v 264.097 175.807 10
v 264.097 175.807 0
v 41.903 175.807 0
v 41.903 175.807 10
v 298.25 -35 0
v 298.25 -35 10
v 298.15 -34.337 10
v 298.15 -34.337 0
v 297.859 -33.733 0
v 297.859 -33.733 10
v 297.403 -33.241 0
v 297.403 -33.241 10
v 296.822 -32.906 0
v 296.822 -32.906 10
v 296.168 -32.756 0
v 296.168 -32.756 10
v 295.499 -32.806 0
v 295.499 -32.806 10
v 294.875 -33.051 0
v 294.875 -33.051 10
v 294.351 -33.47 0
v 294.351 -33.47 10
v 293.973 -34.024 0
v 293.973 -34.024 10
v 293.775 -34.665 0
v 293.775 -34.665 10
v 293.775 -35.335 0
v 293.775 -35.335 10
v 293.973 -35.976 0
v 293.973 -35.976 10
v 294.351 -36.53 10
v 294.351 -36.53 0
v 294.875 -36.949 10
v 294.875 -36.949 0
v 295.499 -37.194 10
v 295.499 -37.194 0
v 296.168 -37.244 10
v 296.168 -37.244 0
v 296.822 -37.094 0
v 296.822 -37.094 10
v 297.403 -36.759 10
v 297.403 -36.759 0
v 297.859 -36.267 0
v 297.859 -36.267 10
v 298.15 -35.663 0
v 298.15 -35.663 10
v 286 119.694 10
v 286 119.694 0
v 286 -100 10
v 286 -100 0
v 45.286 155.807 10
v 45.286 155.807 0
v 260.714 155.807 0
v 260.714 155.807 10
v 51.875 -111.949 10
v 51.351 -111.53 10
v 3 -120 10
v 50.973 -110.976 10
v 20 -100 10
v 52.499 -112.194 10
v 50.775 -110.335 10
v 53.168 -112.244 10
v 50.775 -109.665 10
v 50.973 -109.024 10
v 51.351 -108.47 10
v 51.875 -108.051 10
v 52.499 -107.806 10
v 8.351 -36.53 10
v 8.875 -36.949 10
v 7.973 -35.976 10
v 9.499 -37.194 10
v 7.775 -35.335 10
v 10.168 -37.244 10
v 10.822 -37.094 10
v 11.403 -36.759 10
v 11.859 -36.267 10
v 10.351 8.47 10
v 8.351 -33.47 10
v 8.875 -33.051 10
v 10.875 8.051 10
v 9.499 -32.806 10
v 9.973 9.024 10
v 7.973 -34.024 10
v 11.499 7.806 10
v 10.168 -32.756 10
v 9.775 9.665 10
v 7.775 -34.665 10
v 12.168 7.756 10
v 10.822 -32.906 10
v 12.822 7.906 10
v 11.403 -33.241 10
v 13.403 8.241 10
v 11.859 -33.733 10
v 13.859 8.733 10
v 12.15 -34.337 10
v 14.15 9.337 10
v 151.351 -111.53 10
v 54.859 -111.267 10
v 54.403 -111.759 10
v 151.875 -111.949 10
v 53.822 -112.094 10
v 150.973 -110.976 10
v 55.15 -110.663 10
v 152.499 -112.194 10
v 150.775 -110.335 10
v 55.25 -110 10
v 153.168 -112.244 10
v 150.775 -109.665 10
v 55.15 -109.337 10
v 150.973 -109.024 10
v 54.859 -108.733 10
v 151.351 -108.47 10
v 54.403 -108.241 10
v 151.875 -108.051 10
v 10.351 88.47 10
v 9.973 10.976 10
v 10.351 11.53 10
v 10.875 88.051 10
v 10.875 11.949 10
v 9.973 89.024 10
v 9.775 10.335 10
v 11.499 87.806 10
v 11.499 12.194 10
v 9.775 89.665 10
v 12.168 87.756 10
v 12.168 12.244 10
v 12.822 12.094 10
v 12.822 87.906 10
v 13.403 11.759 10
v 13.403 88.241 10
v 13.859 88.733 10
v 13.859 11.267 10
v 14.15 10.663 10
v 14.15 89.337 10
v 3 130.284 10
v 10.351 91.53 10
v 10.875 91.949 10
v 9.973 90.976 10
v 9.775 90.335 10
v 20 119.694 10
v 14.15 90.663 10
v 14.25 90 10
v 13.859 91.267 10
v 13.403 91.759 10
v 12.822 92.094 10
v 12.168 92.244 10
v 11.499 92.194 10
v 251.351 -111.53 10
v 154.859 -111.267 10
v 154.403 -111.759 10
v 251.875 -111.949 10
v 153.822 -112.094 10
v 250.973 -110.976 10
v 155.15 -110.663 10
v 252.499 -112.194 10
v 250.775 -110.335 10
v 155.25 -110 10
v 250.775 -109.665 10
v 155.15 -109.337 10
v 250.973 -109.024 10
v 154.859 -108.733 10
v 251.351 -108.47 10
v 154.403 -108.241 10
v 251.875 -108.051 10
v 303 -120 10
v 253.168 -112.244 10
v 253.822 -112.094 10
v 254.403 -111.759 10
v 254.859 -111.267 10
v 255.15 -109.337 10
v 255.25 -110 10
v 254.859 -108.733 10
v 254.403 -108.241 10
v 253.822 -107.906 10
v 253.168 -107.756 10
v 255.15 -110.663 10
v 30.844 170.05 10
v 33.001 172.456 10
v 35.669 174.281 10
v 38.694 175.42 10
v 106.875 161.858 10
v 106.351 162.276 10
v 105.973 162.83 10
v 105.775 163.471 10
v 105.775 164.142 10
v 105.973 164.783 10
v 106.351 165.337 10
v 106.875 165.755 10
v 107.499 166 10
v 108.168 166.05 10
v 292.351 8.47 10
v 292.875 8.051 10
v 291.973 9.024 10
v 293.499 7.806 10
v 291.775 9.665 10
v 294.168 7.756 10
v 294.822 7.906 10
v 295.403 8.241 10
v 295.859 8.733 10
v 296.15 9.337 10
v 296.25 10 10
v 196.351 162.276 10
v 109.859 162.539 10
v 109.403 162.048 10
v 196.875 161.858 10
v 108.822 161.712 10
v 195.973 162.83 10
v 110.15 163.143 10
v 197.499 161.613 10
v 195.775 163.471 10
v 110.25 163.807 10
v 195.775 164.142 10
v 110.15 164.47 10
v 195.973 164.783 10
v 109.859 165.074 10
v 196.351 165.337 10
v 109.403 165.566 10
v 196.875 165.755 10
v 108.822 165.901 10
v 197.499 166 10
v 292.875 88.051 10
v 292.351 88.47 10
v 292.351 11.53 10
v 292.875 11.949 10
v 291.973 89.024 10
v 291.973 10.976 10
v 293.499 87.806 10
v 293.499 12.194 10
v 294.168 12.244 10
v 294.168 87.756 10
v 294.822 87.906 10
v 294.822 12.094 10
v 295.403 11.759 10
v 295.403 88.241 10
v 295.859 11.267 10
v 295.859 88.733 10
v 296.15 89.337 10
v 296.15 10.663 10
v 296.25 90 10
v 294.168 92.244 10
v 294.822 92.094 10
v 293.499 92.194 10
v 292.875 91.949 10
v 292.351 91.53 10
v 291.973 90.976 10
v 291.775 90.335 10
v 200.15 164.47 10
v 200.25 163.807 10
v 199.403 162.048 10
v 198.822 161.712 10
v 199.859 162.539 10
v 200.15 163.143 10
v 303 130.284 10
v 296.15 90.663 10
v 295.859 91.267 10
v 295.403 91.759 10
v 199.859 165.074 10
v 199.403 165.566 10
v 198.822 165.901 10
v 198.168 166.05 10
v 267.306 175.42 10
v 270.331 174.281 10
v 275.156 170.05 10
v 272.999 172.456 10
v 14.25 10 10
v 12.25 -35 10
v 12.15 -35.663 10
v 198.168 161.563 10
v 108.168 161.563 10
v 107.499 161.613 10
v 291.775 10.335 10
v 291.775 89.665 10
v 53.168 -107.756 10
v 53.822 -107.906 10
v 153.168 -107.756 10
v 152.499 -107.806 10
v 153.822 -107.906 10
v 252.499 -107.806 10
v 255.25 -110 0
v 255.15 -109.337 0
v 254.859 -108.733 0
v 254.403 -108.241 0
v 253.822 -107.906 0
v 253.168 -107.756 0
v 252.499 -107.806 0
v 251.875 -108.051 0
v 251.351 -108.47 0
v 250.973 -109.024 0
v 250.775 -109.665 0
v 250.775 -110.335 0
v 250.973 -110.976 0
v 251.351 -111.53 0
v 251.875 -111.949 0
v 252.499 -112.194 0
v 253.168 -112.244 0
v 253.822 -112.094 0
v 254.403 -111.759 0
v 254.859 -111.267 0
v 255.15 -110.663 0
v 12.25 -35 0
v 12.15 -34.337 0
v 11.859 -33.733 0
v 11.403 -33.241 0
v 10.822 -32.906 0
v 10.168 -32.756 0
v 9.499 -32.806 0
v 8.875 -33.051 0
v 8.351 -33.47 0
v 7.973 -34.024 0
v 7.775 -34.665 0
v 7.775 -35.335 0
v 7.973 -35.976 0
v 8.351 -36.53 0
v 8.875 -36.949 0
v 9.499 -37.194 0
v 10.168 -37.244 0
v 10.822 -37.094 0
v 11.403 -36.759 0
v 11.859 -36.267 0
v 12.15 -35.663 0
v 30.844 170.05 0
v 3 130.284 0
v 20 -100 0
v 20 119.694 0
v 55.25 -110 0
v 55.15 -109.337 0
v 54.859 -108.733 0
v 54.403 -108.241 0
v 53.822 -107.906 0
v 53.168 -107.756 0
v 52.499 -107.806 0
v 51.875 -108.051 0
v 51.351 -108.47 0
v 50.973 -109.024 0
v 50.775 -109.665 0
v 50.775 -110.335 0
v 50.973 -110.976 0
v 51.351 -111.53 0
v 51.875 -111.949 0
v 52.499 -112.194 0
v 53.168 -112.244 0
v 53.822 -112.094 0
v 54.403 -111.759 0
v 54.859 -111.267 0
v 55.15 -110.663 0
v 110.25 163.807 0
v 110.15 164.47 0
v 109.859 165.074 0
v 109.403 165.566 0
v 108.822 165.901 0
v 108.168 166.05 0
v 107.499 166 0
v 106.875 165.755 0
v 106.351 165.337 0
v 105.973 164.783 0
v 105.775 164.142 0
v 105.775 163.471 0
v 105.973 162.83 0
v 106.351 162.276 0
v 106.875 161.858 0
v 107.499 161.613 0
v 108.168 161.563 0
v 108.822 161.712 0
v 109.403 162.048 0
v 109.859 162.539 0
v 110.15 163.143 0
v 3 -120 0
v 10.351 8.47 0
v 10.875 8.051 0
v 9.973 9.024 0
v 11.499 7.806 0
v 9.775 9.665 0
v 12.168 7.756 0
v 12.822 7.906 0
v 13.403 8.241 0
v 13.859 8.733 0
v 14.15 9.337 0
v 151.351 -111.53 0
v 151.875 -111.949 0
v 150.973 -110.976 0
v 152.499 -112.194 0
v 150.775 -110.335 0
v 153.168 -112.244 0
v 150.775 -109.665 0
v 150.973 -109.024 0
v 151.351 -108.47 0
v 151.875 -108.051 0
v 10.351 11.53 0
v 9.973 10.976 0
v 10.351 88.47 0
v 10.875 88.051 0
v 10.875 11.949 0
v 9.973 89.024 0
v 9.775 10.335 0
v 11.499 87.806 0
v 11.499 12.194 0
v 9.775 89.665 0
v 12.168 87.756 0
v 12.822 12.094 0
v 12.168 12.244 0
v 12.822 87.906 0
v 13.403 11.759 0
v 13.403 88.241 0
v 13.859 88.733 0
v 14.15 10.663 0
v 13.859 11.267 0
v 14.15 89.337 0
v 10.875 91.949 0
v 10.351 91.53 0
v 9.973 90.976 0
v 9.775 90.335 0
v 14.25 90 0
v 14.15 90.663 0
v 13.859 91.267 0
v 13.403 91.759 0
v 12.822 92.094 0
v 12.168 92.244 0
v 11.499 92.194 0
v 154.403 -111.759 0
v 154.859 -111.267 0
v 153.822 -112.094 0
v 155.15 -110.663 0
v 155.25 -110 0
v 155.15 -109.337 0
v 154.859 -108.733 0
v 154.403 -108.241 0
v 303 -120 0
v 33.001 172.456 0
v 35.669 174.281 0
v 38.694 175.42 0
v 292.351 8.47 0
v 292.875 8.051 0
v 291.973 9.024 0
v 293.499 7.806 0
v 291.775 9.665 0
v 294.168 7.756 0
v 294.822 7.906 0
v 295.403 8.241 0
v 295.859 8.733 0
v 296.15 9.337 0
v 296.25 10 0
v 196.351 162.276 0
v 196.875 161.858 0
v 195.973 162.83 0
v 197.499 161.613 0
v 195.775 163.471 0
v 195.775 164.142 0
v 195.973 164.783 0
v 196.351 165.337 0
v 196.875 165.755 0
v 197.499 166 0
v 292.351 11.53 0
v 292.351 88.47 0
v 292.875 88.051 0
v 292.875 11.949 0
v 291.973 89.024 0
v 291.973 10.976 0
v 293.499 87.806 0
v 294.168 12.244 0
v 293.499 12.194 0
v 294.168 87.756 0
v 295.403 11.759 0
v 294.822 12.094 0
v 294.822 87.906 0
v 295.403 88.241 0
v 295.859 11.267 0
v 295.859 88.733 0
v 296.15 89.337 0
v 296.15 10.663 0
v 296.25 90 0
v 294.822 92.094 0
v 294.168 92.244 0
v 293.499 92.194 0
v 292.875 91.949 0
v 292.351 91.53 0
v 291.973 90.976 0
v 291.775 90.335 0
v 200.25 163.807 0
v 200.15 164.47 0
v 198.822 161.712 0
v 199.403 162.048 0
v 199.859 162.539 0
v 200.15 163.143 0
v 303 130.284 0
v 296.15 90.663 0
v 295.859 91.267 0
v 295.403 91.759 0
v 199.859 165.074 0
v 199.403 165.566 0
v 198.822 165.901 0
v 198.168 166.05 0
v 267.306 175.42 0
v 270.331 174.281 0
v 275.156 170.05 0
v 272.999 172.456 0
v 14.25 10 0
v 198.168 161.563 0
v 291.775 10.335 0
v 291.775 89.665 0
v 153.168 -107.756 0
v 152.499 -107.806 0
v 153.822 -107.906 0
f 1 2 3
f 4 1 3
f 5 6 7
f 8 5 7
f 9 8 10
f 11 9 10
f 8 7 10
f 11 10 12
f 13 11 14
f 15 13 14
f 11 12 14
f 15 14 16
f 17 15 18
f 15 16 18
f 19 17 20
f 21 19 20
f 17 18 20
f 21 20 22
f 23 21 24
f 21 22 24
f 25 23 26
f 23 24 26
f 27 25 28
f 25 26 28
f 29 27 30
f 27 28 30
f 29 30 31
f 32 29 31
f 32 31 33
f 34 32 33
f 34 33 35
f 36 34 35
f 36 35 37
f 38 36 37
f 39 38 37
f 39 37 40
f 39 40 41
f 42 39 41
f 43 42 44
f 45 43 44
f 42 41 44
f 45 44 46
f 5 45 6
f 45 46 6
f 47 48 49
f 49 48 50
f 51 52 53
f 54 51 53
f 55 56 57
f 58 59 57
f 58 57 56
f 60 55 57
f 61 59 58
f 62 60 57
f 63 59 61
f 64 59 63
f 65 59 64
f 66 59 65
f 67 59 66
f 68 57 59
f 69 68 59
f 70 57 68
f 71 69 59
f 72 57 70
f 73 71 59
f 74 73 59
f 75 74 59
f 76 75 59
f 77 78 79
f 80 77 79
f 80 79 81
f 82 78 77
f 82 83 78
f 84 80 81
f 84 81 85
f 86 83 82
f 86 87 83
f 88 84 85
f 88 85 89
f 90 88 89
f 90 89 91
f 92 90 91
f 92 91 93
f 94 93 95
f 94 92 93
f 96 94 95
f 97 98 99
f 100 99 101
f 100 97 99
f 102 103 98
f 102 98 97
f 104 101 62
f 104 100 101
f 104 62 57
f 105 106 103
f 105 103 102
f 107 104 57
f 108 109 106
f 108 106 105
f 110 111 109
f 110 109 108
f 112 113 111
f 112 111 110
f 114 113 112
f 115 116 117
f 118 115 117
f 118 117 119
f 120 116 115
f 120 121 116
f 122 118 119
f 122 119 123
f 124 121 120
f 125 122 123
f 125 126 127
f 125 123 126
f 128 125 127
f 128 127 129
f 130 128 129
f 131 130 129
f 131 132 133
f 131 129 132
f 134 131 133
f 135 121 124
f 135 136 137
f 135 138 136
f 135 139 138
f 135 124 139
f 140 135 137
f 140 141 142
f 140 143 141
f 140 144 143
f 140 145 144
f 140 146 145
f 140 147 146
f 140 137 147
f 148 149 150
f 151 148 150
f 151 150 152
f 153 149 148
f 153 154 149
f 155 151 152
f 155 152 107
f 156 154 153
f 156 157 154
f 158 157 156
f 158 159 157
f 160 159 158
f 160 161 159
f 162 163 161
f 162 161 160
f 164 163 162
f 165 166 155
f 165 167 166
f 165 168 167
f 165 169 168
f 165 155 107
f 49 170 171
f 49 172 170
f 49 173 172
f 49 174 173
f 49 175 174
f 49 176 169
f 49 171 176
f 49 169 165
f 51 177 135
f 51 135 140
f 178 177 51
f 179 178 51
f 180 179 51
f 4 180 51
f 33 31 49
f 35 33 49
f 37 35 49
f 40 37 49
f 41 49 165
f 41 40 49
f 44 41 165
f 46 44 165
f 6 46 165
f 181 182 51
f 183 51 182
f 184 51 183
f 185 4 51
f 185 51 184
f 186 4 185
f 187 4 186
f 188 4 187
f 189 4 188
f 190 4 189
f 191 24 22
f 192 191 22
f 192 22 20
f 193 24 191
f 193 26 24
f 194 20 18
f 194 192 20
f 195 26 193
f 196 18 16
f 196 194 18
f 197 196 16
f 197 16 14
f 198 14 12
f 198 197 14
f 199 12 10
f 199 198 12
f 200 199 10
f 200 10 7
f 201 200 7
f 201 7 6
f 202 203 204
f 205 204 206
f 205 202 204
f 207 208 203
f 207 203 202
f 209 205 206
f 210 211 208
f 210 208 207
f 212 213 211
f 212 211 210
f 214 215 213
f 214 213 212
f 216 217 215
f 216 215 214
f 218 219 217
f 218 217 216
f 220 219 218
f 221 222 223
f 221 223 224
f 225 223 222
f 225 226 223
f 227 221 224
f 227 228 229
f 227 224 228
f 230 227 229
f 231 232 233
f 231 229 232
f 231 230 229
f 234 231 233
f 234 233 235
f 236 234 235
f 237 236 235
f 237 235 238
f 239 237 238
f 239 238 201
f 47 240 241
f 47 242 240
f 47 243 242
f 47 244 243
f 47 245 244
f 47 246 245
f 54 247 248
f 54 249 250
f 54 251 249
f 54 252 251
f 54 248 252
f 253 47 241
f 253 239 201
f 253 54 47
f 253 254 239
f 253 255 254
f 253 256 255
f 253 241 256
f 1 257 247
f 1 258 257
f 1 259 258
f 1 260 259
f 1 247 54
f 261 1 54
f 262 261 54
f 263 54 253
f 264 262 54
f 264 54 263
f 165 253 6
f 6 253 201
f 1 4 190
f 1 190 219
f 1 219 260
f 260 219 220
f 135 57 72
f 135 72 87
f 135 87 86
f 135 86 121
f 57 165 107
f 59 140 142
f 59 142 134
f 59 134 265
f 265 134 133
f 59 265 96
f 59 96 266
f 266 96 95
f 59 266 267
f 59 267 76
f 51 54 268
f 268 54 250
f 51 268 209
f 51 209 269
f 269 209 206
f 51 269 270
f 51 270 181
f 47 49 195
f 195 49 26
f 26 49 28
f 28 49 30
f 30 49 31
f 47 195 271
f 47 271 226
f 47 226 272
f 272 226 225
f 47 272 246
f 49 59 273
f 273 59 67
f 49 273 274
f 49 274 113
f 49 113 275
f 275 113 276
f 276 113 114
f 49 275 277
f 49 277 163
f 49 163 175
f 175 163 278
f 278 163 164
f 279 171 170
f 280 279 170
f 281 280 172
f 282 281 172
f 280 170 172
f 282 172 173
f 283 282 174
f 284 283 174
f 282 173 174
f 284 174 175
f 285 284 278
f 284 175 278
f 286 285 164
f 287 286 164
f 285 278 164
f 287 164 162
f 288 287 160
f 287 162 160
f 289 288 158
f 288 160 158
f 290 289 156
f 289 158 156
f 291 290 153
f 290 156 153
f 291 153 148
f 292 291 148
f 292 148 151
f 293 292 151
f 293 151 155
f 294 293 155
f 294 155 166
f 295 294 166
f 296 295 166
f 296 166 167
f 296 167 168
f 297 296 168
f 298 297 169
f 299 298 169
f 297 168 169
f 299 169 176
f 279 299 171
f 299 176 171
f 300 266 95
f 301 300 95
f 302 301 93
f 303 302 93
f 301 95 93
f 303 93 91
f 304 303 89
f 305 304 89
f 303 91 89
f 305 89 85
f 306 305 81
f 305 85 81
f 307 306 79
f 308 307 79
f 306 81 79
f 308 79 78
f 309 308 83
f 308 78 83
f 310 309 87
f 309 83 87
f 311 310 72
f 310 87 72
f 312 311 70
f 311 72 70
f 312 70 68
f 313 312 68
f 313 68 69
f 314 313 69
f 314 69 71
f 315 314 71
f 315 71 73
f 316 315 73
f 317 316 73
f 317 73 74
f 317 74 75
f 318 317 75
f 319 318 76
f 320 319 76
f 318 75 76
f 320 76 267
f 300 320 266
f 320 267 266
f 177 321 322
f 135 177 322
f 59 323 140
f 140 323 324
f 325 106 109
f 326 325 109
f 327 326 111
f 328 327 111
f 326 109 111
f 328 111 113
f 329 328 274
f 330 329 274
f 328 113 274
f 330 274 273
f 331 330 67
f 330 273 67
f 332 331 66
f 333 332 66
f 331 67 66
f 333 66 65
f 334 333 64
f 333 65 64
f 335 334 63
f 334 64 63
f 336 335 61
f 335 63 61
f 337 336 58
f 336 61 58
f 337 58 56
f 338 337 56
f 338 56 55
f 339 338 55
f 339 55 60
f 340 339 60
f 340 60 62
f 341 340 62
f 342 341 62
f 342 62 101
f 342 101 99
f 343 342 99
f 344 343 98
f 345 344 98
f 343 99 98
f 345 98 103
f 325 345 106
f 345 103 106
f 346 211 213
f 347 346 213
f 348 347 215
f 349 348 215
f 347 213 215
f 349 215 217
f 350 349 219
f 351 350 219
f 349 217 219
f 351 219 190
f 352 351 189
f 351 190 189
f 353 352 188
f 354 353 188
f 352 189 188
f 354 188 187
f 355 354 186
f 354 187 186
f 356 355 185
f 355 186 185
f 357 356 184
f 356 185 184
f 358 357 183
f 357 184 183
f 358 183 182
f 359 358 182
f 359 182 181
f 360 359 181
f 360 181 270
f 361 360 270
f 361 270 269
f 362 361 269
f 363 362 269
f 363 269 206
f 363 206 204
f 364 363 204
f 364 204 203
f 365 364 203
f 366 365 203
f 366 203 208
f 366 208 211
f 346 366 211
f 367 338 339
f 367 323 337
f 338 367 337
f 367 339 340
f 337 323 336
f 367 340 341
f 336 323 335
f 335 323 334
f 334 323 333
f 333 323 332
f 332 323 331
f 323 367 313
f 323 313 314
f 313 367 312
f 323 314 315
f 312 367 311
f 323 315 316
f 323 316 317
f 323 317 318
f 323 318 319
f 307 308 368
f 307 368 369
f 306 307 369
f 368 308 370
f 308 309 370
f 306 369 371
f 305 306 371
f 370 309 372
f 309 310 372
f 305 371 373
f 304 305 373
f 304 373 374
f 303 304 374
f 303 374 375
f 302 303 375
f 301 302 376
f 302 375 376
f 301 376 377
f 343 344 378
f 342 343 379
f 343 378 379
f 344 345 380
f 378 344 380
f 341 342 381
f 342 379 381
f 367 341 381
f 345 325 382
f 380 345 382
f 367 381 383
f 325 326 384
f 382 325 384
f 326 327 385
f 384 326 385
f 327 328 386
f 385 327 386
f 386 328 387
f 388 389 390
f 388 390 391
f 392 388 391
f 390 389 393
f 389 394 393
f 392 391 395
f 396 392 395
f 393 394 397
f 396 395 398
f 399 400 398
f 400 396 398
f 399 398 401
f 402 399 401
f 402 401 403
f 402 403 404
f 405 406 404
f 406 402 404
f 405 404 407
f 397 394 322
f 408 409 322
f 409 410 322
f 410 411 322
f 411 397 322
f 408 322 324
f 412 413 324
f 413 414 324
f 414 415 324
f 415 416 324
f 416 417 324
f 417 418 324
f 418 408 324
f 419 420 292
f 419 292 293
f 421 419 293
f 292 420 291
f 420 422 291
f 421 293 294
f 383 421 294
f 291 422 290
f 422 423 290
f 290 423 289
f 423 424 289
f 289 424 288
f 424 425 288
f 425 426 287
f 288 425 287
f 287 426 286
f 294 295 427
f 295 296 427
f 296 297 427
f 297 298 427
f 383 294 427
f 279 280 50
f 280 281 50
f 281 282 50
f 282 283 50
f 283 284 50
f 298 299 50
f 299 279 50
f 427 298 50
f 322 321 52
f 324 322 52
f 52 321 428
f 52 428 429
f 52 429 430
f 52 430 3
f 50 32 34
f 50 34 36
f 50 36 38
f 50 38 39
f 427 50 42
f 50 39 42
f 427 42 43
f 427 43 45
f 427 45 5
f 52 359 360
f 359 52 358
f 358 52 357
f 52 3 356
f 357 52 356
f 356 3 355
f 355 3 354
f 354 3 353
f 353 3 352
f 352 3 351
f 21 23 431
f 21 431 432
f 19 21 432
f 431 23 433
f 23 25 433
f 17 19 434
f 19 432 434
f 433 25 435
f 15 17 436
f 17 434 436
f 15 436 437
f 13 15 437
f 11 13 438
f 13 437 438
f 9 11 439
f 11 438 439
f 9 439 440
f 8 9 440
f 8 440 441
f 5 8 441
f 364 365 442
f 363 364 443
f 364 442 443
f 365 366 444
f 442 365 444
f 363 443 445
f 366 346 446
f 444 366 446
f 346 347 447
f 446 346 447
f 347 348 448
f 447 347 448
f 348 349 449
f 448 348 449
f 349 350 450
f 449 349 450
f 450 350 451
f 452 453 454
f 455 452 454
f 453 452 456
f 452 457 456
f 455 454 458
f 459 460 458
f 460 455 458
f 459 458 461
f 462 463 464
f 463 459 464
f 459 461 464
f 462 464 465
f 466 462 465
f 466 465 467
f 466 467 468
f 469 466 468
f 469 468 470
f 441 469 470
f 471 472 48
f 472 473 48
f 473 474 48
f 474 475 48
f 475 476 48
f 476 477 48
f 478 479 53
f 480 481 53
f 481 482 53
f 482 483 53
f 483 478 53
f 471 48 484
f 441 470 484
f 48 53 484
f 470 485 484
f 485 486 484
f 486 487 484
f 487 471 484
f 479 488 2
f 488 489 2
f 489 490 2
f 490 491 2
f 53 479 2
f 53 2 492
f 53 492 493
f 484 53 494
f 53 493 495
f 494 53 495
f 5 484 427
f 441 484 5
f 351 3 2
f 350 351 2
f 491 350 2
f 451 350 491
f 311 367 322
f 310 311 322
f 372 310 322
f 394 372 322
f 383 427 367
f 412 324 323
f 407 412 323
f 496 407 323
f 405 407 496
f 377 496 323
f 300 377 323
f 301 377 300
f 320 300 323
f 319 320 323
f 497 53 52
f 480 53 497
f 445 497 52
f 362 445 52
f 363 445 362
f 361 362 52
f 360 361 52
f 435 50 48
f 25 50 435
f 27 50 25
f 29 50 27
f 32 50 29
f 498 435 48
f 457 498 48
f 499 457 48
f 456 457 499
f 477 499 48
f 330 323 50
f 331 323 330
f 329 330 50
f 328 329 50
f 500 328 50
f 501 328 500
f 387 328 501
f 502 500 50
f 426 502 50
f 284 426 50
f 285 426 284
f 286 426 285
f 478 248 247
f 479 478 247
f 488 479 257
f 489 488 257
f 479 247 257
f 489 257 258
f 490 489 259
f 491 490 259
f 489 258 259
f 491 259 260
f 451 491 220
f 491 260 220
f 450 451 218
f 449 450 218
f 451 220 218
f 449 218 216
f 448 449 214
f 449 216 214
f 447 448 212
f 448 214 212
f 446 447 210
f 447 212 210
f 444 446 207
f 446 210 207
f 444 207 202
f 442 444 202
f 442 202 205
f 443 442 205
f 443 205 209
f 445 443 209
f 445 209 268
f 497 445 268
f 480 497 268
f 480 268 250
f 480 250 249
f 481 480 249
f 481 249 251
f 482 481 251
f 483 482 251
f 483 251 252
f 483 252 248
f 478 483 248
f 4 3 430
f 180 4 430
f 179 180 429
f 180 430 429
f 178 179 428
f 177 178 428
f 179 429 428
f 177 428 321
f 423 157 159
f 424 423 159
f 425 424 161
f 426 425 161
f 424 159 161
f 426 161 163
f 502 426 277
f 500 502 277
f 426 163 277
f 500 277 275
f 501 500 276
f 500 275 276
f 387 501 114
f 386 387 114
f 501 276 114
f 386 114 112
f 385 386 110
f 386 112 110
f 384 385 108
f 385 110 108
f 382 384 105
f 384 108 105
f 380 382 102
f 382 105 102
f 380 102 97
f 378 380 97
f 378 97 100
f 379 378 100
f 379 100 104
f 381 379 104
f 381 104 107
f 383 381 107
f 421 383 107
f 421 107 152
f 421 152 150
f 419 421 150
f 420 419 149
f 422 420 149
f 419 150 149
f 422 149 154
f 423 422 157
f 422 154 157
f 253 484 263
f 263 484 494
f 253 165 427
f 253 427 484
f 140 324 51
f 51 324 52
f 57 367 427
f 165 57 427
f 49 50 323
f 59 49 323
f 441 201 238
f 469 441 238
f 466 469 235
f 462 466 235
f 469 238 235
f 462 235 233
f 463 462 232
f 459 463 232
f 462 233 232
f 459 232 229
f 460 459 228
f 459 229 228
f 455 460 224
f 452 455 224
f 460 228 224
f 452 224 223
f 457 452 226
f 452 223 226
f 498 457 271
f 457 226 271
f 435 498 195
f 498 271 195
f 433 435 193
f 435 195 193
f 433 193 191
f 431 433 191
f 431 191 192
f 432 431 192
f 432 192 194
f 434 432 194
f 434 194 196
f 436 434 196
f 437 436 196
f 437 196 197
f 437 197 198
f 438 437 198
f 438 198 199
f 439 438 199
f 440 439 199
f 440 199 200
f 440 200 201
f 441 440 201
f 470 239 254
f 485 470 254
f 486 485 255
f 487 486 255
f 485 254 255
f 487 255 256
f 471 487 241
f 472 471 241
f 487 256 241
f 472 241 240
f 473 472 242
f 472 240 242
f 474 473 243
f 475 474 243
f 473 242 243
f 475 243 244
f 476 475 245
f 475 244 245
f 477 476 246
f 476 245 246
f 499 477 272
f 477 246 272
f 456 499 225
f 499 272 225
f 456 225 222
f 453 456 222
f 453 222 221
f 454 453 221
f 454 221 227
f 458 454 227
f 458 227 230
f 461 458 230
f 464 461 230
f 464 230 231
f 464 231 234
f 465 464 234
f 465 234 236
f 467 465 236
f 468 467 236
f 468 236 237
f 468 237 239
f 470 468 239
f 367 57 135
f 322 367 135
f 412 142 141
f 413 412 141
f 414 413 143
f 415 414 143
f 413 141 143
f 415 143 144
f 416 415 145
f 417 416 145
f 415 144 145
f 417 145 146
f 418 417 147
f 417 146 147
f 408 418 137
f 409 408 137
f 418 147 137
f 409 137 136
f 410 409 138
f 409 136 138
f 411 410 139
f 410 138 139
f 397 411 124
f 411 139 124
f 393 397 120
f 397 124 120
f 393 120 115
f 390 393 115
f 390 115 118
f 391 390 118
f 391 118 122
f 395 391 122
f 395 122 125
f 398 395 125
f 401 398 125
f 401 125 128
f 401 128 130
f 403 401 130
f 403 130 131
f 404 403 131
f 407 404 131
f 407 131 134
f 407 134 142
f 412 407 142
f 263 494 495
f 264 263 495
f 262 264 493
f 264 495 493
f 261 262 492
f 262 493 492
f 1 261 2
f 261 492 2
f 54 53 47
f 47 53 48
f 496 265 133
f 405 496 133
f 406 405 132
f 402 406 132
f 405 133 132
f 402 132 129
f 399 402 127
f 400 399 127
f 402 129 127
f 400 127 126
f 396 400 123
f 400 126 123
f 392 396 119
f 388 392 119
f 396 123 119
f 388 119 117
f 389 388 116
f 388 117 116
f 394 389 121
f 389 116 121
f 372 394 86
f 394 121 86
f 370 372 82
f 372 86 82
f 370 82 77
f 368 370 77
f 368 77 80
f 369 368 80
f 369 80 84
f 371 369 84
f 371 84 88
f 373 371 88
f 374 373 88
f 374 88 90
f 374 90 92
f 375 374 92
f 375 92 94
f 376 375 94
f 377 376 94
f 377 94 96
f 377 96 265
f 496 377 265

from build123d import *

# Parameters (mm, degrees)
SALIENTE_EXTRUIR1_DEPTH = 10
CROQUIS2_R              = 2.25
CORTAR_EXTRUIR1_DEPTH   = 11
CROQUIS3_R              = 2.25
CORTAR_EXTRUIR2_DEPTH   = 10
CROQUIS4_OUTSIDE_W      = 393.144
CROQUIS4_OUTSIDE_H      = 382.951
CROQUIS4_OUTSIDE_W_2    = 300
CROQUIS4_OUTSIDE_H_2    = 346.918637929
CORTAR_EXTRUIR3_DEPTH   = 10


with BuildPart() as part:
    # Croquis1 → Saliente-Extruir1 (new body)
    with BuildSketch(Plane.XY):
        with BuildLine():
            Line((303.558552598, 129.486748241), (275.155897415, 170.049943626))
            ThreePointArc((275.155897415, 170.049943626), (270.330951096, 174.281307983), (264.097344818, 175.806661735))
            Line((264.097344818, 175.806661735), (41.902655182, 175.806661735))
            ThreePointArc((41.902655182, 175.806661735), (35.669048904, 174.281307983), (30.844102585, 170.049943626))
            Line((30.844102585, 170.049943626), (2.441447402, 129.486748241))
            ThreePointArc((2.441447402, 129.486748241), (0.624821165, 125.802994643), (0, 121.74346635))
            Line((0, 121.74346635), (0, 0))
            Line((0, 0), (0, -120))
            Line((0, -120), (306, -120))
            Line((306, -120), (306, 0))
            Line((306, 0), (306, 121.74346635))
            ThreePointArc((306, 121.74346635), (305.375178835, 125.802994643), (303.558552598, 129.486748241))
        make_face()
        Polygon((20, 0), (20, 119.694024222), (45.286341011, 155.806661735), (260.713658989, 155.806661735), (286, 119.694024222), (286, 0), (286, -100), (20, -100), align=None, mode=Mode.SUBTRACT)
    extrude(amount=SALIENTE_EXTRUIR1_DEPTH)

    # Croquis2 → Cortar-Extruir1 (cut, through all)
    with BuildSketch(Plane.XY.offset(10)):
        with Locations((108, 163.806661735)):
            Circle(CROQUIS2_R)
        with Locations((198, 163.806661735)):
            Circle(CROQUIS2_R)
        with Locations((12, 10)):
            Circle(CROQUIS2_R)
        with Locations((294, 10)):
            Circle(CROQUIS2_R)
        with Locations((294, 90)):
            Circle(CROQUIS2_R)
        with Locations((12, 90)):
            Circle(CROQUIS2_R)
    extrude(amount=-CORTAR_EXTRUIR1_DEPTH, mode=Mode.SUBTRACT)

    # Croquis3 → Cortar-Extruir2 (cut)
    with BuildSketch(Plane.XY.offset(10)):
        with Locations((10, -35)):
            Circle(CROQUIS3_R)
        with Locations((296, -35)):
            Circle(CROQUIS3_R)
        with Locations((53, -110)):
            Circle(CROQUIS3_R)
        with Locations((153, -110)):
            Circle(CROQUIS3_R)
        with Locations((253, -110)):
            Circle(CROQUIS3_R)
    extrude(amount=-CORTAR_EXTRUIR2_DEPTH, mode=Mode.SUBTRACT)

    # Croquis4 outside → Cortar-Extruir3 (cut)
    with BuildSketch(Plane.XY.offset(10)):
        with Locations((153, 27.9035)):
            Rectangle(CROQUIS4_OUTSIDE_W, CROQUIS4_OUTSIDE_H)
        with Locations((153, 32.896001841)):
            Rectangle(CROQUIS4_OUTSIDE_W_2, CROQUIS4_OUTSIDE_H_2, mode=Mode.SUBTRACT)
    extrude(amount=-CORTAR_EXTRUIR3_DEPTH, mode=Mode.SUBTRACT)


solid = part.part
